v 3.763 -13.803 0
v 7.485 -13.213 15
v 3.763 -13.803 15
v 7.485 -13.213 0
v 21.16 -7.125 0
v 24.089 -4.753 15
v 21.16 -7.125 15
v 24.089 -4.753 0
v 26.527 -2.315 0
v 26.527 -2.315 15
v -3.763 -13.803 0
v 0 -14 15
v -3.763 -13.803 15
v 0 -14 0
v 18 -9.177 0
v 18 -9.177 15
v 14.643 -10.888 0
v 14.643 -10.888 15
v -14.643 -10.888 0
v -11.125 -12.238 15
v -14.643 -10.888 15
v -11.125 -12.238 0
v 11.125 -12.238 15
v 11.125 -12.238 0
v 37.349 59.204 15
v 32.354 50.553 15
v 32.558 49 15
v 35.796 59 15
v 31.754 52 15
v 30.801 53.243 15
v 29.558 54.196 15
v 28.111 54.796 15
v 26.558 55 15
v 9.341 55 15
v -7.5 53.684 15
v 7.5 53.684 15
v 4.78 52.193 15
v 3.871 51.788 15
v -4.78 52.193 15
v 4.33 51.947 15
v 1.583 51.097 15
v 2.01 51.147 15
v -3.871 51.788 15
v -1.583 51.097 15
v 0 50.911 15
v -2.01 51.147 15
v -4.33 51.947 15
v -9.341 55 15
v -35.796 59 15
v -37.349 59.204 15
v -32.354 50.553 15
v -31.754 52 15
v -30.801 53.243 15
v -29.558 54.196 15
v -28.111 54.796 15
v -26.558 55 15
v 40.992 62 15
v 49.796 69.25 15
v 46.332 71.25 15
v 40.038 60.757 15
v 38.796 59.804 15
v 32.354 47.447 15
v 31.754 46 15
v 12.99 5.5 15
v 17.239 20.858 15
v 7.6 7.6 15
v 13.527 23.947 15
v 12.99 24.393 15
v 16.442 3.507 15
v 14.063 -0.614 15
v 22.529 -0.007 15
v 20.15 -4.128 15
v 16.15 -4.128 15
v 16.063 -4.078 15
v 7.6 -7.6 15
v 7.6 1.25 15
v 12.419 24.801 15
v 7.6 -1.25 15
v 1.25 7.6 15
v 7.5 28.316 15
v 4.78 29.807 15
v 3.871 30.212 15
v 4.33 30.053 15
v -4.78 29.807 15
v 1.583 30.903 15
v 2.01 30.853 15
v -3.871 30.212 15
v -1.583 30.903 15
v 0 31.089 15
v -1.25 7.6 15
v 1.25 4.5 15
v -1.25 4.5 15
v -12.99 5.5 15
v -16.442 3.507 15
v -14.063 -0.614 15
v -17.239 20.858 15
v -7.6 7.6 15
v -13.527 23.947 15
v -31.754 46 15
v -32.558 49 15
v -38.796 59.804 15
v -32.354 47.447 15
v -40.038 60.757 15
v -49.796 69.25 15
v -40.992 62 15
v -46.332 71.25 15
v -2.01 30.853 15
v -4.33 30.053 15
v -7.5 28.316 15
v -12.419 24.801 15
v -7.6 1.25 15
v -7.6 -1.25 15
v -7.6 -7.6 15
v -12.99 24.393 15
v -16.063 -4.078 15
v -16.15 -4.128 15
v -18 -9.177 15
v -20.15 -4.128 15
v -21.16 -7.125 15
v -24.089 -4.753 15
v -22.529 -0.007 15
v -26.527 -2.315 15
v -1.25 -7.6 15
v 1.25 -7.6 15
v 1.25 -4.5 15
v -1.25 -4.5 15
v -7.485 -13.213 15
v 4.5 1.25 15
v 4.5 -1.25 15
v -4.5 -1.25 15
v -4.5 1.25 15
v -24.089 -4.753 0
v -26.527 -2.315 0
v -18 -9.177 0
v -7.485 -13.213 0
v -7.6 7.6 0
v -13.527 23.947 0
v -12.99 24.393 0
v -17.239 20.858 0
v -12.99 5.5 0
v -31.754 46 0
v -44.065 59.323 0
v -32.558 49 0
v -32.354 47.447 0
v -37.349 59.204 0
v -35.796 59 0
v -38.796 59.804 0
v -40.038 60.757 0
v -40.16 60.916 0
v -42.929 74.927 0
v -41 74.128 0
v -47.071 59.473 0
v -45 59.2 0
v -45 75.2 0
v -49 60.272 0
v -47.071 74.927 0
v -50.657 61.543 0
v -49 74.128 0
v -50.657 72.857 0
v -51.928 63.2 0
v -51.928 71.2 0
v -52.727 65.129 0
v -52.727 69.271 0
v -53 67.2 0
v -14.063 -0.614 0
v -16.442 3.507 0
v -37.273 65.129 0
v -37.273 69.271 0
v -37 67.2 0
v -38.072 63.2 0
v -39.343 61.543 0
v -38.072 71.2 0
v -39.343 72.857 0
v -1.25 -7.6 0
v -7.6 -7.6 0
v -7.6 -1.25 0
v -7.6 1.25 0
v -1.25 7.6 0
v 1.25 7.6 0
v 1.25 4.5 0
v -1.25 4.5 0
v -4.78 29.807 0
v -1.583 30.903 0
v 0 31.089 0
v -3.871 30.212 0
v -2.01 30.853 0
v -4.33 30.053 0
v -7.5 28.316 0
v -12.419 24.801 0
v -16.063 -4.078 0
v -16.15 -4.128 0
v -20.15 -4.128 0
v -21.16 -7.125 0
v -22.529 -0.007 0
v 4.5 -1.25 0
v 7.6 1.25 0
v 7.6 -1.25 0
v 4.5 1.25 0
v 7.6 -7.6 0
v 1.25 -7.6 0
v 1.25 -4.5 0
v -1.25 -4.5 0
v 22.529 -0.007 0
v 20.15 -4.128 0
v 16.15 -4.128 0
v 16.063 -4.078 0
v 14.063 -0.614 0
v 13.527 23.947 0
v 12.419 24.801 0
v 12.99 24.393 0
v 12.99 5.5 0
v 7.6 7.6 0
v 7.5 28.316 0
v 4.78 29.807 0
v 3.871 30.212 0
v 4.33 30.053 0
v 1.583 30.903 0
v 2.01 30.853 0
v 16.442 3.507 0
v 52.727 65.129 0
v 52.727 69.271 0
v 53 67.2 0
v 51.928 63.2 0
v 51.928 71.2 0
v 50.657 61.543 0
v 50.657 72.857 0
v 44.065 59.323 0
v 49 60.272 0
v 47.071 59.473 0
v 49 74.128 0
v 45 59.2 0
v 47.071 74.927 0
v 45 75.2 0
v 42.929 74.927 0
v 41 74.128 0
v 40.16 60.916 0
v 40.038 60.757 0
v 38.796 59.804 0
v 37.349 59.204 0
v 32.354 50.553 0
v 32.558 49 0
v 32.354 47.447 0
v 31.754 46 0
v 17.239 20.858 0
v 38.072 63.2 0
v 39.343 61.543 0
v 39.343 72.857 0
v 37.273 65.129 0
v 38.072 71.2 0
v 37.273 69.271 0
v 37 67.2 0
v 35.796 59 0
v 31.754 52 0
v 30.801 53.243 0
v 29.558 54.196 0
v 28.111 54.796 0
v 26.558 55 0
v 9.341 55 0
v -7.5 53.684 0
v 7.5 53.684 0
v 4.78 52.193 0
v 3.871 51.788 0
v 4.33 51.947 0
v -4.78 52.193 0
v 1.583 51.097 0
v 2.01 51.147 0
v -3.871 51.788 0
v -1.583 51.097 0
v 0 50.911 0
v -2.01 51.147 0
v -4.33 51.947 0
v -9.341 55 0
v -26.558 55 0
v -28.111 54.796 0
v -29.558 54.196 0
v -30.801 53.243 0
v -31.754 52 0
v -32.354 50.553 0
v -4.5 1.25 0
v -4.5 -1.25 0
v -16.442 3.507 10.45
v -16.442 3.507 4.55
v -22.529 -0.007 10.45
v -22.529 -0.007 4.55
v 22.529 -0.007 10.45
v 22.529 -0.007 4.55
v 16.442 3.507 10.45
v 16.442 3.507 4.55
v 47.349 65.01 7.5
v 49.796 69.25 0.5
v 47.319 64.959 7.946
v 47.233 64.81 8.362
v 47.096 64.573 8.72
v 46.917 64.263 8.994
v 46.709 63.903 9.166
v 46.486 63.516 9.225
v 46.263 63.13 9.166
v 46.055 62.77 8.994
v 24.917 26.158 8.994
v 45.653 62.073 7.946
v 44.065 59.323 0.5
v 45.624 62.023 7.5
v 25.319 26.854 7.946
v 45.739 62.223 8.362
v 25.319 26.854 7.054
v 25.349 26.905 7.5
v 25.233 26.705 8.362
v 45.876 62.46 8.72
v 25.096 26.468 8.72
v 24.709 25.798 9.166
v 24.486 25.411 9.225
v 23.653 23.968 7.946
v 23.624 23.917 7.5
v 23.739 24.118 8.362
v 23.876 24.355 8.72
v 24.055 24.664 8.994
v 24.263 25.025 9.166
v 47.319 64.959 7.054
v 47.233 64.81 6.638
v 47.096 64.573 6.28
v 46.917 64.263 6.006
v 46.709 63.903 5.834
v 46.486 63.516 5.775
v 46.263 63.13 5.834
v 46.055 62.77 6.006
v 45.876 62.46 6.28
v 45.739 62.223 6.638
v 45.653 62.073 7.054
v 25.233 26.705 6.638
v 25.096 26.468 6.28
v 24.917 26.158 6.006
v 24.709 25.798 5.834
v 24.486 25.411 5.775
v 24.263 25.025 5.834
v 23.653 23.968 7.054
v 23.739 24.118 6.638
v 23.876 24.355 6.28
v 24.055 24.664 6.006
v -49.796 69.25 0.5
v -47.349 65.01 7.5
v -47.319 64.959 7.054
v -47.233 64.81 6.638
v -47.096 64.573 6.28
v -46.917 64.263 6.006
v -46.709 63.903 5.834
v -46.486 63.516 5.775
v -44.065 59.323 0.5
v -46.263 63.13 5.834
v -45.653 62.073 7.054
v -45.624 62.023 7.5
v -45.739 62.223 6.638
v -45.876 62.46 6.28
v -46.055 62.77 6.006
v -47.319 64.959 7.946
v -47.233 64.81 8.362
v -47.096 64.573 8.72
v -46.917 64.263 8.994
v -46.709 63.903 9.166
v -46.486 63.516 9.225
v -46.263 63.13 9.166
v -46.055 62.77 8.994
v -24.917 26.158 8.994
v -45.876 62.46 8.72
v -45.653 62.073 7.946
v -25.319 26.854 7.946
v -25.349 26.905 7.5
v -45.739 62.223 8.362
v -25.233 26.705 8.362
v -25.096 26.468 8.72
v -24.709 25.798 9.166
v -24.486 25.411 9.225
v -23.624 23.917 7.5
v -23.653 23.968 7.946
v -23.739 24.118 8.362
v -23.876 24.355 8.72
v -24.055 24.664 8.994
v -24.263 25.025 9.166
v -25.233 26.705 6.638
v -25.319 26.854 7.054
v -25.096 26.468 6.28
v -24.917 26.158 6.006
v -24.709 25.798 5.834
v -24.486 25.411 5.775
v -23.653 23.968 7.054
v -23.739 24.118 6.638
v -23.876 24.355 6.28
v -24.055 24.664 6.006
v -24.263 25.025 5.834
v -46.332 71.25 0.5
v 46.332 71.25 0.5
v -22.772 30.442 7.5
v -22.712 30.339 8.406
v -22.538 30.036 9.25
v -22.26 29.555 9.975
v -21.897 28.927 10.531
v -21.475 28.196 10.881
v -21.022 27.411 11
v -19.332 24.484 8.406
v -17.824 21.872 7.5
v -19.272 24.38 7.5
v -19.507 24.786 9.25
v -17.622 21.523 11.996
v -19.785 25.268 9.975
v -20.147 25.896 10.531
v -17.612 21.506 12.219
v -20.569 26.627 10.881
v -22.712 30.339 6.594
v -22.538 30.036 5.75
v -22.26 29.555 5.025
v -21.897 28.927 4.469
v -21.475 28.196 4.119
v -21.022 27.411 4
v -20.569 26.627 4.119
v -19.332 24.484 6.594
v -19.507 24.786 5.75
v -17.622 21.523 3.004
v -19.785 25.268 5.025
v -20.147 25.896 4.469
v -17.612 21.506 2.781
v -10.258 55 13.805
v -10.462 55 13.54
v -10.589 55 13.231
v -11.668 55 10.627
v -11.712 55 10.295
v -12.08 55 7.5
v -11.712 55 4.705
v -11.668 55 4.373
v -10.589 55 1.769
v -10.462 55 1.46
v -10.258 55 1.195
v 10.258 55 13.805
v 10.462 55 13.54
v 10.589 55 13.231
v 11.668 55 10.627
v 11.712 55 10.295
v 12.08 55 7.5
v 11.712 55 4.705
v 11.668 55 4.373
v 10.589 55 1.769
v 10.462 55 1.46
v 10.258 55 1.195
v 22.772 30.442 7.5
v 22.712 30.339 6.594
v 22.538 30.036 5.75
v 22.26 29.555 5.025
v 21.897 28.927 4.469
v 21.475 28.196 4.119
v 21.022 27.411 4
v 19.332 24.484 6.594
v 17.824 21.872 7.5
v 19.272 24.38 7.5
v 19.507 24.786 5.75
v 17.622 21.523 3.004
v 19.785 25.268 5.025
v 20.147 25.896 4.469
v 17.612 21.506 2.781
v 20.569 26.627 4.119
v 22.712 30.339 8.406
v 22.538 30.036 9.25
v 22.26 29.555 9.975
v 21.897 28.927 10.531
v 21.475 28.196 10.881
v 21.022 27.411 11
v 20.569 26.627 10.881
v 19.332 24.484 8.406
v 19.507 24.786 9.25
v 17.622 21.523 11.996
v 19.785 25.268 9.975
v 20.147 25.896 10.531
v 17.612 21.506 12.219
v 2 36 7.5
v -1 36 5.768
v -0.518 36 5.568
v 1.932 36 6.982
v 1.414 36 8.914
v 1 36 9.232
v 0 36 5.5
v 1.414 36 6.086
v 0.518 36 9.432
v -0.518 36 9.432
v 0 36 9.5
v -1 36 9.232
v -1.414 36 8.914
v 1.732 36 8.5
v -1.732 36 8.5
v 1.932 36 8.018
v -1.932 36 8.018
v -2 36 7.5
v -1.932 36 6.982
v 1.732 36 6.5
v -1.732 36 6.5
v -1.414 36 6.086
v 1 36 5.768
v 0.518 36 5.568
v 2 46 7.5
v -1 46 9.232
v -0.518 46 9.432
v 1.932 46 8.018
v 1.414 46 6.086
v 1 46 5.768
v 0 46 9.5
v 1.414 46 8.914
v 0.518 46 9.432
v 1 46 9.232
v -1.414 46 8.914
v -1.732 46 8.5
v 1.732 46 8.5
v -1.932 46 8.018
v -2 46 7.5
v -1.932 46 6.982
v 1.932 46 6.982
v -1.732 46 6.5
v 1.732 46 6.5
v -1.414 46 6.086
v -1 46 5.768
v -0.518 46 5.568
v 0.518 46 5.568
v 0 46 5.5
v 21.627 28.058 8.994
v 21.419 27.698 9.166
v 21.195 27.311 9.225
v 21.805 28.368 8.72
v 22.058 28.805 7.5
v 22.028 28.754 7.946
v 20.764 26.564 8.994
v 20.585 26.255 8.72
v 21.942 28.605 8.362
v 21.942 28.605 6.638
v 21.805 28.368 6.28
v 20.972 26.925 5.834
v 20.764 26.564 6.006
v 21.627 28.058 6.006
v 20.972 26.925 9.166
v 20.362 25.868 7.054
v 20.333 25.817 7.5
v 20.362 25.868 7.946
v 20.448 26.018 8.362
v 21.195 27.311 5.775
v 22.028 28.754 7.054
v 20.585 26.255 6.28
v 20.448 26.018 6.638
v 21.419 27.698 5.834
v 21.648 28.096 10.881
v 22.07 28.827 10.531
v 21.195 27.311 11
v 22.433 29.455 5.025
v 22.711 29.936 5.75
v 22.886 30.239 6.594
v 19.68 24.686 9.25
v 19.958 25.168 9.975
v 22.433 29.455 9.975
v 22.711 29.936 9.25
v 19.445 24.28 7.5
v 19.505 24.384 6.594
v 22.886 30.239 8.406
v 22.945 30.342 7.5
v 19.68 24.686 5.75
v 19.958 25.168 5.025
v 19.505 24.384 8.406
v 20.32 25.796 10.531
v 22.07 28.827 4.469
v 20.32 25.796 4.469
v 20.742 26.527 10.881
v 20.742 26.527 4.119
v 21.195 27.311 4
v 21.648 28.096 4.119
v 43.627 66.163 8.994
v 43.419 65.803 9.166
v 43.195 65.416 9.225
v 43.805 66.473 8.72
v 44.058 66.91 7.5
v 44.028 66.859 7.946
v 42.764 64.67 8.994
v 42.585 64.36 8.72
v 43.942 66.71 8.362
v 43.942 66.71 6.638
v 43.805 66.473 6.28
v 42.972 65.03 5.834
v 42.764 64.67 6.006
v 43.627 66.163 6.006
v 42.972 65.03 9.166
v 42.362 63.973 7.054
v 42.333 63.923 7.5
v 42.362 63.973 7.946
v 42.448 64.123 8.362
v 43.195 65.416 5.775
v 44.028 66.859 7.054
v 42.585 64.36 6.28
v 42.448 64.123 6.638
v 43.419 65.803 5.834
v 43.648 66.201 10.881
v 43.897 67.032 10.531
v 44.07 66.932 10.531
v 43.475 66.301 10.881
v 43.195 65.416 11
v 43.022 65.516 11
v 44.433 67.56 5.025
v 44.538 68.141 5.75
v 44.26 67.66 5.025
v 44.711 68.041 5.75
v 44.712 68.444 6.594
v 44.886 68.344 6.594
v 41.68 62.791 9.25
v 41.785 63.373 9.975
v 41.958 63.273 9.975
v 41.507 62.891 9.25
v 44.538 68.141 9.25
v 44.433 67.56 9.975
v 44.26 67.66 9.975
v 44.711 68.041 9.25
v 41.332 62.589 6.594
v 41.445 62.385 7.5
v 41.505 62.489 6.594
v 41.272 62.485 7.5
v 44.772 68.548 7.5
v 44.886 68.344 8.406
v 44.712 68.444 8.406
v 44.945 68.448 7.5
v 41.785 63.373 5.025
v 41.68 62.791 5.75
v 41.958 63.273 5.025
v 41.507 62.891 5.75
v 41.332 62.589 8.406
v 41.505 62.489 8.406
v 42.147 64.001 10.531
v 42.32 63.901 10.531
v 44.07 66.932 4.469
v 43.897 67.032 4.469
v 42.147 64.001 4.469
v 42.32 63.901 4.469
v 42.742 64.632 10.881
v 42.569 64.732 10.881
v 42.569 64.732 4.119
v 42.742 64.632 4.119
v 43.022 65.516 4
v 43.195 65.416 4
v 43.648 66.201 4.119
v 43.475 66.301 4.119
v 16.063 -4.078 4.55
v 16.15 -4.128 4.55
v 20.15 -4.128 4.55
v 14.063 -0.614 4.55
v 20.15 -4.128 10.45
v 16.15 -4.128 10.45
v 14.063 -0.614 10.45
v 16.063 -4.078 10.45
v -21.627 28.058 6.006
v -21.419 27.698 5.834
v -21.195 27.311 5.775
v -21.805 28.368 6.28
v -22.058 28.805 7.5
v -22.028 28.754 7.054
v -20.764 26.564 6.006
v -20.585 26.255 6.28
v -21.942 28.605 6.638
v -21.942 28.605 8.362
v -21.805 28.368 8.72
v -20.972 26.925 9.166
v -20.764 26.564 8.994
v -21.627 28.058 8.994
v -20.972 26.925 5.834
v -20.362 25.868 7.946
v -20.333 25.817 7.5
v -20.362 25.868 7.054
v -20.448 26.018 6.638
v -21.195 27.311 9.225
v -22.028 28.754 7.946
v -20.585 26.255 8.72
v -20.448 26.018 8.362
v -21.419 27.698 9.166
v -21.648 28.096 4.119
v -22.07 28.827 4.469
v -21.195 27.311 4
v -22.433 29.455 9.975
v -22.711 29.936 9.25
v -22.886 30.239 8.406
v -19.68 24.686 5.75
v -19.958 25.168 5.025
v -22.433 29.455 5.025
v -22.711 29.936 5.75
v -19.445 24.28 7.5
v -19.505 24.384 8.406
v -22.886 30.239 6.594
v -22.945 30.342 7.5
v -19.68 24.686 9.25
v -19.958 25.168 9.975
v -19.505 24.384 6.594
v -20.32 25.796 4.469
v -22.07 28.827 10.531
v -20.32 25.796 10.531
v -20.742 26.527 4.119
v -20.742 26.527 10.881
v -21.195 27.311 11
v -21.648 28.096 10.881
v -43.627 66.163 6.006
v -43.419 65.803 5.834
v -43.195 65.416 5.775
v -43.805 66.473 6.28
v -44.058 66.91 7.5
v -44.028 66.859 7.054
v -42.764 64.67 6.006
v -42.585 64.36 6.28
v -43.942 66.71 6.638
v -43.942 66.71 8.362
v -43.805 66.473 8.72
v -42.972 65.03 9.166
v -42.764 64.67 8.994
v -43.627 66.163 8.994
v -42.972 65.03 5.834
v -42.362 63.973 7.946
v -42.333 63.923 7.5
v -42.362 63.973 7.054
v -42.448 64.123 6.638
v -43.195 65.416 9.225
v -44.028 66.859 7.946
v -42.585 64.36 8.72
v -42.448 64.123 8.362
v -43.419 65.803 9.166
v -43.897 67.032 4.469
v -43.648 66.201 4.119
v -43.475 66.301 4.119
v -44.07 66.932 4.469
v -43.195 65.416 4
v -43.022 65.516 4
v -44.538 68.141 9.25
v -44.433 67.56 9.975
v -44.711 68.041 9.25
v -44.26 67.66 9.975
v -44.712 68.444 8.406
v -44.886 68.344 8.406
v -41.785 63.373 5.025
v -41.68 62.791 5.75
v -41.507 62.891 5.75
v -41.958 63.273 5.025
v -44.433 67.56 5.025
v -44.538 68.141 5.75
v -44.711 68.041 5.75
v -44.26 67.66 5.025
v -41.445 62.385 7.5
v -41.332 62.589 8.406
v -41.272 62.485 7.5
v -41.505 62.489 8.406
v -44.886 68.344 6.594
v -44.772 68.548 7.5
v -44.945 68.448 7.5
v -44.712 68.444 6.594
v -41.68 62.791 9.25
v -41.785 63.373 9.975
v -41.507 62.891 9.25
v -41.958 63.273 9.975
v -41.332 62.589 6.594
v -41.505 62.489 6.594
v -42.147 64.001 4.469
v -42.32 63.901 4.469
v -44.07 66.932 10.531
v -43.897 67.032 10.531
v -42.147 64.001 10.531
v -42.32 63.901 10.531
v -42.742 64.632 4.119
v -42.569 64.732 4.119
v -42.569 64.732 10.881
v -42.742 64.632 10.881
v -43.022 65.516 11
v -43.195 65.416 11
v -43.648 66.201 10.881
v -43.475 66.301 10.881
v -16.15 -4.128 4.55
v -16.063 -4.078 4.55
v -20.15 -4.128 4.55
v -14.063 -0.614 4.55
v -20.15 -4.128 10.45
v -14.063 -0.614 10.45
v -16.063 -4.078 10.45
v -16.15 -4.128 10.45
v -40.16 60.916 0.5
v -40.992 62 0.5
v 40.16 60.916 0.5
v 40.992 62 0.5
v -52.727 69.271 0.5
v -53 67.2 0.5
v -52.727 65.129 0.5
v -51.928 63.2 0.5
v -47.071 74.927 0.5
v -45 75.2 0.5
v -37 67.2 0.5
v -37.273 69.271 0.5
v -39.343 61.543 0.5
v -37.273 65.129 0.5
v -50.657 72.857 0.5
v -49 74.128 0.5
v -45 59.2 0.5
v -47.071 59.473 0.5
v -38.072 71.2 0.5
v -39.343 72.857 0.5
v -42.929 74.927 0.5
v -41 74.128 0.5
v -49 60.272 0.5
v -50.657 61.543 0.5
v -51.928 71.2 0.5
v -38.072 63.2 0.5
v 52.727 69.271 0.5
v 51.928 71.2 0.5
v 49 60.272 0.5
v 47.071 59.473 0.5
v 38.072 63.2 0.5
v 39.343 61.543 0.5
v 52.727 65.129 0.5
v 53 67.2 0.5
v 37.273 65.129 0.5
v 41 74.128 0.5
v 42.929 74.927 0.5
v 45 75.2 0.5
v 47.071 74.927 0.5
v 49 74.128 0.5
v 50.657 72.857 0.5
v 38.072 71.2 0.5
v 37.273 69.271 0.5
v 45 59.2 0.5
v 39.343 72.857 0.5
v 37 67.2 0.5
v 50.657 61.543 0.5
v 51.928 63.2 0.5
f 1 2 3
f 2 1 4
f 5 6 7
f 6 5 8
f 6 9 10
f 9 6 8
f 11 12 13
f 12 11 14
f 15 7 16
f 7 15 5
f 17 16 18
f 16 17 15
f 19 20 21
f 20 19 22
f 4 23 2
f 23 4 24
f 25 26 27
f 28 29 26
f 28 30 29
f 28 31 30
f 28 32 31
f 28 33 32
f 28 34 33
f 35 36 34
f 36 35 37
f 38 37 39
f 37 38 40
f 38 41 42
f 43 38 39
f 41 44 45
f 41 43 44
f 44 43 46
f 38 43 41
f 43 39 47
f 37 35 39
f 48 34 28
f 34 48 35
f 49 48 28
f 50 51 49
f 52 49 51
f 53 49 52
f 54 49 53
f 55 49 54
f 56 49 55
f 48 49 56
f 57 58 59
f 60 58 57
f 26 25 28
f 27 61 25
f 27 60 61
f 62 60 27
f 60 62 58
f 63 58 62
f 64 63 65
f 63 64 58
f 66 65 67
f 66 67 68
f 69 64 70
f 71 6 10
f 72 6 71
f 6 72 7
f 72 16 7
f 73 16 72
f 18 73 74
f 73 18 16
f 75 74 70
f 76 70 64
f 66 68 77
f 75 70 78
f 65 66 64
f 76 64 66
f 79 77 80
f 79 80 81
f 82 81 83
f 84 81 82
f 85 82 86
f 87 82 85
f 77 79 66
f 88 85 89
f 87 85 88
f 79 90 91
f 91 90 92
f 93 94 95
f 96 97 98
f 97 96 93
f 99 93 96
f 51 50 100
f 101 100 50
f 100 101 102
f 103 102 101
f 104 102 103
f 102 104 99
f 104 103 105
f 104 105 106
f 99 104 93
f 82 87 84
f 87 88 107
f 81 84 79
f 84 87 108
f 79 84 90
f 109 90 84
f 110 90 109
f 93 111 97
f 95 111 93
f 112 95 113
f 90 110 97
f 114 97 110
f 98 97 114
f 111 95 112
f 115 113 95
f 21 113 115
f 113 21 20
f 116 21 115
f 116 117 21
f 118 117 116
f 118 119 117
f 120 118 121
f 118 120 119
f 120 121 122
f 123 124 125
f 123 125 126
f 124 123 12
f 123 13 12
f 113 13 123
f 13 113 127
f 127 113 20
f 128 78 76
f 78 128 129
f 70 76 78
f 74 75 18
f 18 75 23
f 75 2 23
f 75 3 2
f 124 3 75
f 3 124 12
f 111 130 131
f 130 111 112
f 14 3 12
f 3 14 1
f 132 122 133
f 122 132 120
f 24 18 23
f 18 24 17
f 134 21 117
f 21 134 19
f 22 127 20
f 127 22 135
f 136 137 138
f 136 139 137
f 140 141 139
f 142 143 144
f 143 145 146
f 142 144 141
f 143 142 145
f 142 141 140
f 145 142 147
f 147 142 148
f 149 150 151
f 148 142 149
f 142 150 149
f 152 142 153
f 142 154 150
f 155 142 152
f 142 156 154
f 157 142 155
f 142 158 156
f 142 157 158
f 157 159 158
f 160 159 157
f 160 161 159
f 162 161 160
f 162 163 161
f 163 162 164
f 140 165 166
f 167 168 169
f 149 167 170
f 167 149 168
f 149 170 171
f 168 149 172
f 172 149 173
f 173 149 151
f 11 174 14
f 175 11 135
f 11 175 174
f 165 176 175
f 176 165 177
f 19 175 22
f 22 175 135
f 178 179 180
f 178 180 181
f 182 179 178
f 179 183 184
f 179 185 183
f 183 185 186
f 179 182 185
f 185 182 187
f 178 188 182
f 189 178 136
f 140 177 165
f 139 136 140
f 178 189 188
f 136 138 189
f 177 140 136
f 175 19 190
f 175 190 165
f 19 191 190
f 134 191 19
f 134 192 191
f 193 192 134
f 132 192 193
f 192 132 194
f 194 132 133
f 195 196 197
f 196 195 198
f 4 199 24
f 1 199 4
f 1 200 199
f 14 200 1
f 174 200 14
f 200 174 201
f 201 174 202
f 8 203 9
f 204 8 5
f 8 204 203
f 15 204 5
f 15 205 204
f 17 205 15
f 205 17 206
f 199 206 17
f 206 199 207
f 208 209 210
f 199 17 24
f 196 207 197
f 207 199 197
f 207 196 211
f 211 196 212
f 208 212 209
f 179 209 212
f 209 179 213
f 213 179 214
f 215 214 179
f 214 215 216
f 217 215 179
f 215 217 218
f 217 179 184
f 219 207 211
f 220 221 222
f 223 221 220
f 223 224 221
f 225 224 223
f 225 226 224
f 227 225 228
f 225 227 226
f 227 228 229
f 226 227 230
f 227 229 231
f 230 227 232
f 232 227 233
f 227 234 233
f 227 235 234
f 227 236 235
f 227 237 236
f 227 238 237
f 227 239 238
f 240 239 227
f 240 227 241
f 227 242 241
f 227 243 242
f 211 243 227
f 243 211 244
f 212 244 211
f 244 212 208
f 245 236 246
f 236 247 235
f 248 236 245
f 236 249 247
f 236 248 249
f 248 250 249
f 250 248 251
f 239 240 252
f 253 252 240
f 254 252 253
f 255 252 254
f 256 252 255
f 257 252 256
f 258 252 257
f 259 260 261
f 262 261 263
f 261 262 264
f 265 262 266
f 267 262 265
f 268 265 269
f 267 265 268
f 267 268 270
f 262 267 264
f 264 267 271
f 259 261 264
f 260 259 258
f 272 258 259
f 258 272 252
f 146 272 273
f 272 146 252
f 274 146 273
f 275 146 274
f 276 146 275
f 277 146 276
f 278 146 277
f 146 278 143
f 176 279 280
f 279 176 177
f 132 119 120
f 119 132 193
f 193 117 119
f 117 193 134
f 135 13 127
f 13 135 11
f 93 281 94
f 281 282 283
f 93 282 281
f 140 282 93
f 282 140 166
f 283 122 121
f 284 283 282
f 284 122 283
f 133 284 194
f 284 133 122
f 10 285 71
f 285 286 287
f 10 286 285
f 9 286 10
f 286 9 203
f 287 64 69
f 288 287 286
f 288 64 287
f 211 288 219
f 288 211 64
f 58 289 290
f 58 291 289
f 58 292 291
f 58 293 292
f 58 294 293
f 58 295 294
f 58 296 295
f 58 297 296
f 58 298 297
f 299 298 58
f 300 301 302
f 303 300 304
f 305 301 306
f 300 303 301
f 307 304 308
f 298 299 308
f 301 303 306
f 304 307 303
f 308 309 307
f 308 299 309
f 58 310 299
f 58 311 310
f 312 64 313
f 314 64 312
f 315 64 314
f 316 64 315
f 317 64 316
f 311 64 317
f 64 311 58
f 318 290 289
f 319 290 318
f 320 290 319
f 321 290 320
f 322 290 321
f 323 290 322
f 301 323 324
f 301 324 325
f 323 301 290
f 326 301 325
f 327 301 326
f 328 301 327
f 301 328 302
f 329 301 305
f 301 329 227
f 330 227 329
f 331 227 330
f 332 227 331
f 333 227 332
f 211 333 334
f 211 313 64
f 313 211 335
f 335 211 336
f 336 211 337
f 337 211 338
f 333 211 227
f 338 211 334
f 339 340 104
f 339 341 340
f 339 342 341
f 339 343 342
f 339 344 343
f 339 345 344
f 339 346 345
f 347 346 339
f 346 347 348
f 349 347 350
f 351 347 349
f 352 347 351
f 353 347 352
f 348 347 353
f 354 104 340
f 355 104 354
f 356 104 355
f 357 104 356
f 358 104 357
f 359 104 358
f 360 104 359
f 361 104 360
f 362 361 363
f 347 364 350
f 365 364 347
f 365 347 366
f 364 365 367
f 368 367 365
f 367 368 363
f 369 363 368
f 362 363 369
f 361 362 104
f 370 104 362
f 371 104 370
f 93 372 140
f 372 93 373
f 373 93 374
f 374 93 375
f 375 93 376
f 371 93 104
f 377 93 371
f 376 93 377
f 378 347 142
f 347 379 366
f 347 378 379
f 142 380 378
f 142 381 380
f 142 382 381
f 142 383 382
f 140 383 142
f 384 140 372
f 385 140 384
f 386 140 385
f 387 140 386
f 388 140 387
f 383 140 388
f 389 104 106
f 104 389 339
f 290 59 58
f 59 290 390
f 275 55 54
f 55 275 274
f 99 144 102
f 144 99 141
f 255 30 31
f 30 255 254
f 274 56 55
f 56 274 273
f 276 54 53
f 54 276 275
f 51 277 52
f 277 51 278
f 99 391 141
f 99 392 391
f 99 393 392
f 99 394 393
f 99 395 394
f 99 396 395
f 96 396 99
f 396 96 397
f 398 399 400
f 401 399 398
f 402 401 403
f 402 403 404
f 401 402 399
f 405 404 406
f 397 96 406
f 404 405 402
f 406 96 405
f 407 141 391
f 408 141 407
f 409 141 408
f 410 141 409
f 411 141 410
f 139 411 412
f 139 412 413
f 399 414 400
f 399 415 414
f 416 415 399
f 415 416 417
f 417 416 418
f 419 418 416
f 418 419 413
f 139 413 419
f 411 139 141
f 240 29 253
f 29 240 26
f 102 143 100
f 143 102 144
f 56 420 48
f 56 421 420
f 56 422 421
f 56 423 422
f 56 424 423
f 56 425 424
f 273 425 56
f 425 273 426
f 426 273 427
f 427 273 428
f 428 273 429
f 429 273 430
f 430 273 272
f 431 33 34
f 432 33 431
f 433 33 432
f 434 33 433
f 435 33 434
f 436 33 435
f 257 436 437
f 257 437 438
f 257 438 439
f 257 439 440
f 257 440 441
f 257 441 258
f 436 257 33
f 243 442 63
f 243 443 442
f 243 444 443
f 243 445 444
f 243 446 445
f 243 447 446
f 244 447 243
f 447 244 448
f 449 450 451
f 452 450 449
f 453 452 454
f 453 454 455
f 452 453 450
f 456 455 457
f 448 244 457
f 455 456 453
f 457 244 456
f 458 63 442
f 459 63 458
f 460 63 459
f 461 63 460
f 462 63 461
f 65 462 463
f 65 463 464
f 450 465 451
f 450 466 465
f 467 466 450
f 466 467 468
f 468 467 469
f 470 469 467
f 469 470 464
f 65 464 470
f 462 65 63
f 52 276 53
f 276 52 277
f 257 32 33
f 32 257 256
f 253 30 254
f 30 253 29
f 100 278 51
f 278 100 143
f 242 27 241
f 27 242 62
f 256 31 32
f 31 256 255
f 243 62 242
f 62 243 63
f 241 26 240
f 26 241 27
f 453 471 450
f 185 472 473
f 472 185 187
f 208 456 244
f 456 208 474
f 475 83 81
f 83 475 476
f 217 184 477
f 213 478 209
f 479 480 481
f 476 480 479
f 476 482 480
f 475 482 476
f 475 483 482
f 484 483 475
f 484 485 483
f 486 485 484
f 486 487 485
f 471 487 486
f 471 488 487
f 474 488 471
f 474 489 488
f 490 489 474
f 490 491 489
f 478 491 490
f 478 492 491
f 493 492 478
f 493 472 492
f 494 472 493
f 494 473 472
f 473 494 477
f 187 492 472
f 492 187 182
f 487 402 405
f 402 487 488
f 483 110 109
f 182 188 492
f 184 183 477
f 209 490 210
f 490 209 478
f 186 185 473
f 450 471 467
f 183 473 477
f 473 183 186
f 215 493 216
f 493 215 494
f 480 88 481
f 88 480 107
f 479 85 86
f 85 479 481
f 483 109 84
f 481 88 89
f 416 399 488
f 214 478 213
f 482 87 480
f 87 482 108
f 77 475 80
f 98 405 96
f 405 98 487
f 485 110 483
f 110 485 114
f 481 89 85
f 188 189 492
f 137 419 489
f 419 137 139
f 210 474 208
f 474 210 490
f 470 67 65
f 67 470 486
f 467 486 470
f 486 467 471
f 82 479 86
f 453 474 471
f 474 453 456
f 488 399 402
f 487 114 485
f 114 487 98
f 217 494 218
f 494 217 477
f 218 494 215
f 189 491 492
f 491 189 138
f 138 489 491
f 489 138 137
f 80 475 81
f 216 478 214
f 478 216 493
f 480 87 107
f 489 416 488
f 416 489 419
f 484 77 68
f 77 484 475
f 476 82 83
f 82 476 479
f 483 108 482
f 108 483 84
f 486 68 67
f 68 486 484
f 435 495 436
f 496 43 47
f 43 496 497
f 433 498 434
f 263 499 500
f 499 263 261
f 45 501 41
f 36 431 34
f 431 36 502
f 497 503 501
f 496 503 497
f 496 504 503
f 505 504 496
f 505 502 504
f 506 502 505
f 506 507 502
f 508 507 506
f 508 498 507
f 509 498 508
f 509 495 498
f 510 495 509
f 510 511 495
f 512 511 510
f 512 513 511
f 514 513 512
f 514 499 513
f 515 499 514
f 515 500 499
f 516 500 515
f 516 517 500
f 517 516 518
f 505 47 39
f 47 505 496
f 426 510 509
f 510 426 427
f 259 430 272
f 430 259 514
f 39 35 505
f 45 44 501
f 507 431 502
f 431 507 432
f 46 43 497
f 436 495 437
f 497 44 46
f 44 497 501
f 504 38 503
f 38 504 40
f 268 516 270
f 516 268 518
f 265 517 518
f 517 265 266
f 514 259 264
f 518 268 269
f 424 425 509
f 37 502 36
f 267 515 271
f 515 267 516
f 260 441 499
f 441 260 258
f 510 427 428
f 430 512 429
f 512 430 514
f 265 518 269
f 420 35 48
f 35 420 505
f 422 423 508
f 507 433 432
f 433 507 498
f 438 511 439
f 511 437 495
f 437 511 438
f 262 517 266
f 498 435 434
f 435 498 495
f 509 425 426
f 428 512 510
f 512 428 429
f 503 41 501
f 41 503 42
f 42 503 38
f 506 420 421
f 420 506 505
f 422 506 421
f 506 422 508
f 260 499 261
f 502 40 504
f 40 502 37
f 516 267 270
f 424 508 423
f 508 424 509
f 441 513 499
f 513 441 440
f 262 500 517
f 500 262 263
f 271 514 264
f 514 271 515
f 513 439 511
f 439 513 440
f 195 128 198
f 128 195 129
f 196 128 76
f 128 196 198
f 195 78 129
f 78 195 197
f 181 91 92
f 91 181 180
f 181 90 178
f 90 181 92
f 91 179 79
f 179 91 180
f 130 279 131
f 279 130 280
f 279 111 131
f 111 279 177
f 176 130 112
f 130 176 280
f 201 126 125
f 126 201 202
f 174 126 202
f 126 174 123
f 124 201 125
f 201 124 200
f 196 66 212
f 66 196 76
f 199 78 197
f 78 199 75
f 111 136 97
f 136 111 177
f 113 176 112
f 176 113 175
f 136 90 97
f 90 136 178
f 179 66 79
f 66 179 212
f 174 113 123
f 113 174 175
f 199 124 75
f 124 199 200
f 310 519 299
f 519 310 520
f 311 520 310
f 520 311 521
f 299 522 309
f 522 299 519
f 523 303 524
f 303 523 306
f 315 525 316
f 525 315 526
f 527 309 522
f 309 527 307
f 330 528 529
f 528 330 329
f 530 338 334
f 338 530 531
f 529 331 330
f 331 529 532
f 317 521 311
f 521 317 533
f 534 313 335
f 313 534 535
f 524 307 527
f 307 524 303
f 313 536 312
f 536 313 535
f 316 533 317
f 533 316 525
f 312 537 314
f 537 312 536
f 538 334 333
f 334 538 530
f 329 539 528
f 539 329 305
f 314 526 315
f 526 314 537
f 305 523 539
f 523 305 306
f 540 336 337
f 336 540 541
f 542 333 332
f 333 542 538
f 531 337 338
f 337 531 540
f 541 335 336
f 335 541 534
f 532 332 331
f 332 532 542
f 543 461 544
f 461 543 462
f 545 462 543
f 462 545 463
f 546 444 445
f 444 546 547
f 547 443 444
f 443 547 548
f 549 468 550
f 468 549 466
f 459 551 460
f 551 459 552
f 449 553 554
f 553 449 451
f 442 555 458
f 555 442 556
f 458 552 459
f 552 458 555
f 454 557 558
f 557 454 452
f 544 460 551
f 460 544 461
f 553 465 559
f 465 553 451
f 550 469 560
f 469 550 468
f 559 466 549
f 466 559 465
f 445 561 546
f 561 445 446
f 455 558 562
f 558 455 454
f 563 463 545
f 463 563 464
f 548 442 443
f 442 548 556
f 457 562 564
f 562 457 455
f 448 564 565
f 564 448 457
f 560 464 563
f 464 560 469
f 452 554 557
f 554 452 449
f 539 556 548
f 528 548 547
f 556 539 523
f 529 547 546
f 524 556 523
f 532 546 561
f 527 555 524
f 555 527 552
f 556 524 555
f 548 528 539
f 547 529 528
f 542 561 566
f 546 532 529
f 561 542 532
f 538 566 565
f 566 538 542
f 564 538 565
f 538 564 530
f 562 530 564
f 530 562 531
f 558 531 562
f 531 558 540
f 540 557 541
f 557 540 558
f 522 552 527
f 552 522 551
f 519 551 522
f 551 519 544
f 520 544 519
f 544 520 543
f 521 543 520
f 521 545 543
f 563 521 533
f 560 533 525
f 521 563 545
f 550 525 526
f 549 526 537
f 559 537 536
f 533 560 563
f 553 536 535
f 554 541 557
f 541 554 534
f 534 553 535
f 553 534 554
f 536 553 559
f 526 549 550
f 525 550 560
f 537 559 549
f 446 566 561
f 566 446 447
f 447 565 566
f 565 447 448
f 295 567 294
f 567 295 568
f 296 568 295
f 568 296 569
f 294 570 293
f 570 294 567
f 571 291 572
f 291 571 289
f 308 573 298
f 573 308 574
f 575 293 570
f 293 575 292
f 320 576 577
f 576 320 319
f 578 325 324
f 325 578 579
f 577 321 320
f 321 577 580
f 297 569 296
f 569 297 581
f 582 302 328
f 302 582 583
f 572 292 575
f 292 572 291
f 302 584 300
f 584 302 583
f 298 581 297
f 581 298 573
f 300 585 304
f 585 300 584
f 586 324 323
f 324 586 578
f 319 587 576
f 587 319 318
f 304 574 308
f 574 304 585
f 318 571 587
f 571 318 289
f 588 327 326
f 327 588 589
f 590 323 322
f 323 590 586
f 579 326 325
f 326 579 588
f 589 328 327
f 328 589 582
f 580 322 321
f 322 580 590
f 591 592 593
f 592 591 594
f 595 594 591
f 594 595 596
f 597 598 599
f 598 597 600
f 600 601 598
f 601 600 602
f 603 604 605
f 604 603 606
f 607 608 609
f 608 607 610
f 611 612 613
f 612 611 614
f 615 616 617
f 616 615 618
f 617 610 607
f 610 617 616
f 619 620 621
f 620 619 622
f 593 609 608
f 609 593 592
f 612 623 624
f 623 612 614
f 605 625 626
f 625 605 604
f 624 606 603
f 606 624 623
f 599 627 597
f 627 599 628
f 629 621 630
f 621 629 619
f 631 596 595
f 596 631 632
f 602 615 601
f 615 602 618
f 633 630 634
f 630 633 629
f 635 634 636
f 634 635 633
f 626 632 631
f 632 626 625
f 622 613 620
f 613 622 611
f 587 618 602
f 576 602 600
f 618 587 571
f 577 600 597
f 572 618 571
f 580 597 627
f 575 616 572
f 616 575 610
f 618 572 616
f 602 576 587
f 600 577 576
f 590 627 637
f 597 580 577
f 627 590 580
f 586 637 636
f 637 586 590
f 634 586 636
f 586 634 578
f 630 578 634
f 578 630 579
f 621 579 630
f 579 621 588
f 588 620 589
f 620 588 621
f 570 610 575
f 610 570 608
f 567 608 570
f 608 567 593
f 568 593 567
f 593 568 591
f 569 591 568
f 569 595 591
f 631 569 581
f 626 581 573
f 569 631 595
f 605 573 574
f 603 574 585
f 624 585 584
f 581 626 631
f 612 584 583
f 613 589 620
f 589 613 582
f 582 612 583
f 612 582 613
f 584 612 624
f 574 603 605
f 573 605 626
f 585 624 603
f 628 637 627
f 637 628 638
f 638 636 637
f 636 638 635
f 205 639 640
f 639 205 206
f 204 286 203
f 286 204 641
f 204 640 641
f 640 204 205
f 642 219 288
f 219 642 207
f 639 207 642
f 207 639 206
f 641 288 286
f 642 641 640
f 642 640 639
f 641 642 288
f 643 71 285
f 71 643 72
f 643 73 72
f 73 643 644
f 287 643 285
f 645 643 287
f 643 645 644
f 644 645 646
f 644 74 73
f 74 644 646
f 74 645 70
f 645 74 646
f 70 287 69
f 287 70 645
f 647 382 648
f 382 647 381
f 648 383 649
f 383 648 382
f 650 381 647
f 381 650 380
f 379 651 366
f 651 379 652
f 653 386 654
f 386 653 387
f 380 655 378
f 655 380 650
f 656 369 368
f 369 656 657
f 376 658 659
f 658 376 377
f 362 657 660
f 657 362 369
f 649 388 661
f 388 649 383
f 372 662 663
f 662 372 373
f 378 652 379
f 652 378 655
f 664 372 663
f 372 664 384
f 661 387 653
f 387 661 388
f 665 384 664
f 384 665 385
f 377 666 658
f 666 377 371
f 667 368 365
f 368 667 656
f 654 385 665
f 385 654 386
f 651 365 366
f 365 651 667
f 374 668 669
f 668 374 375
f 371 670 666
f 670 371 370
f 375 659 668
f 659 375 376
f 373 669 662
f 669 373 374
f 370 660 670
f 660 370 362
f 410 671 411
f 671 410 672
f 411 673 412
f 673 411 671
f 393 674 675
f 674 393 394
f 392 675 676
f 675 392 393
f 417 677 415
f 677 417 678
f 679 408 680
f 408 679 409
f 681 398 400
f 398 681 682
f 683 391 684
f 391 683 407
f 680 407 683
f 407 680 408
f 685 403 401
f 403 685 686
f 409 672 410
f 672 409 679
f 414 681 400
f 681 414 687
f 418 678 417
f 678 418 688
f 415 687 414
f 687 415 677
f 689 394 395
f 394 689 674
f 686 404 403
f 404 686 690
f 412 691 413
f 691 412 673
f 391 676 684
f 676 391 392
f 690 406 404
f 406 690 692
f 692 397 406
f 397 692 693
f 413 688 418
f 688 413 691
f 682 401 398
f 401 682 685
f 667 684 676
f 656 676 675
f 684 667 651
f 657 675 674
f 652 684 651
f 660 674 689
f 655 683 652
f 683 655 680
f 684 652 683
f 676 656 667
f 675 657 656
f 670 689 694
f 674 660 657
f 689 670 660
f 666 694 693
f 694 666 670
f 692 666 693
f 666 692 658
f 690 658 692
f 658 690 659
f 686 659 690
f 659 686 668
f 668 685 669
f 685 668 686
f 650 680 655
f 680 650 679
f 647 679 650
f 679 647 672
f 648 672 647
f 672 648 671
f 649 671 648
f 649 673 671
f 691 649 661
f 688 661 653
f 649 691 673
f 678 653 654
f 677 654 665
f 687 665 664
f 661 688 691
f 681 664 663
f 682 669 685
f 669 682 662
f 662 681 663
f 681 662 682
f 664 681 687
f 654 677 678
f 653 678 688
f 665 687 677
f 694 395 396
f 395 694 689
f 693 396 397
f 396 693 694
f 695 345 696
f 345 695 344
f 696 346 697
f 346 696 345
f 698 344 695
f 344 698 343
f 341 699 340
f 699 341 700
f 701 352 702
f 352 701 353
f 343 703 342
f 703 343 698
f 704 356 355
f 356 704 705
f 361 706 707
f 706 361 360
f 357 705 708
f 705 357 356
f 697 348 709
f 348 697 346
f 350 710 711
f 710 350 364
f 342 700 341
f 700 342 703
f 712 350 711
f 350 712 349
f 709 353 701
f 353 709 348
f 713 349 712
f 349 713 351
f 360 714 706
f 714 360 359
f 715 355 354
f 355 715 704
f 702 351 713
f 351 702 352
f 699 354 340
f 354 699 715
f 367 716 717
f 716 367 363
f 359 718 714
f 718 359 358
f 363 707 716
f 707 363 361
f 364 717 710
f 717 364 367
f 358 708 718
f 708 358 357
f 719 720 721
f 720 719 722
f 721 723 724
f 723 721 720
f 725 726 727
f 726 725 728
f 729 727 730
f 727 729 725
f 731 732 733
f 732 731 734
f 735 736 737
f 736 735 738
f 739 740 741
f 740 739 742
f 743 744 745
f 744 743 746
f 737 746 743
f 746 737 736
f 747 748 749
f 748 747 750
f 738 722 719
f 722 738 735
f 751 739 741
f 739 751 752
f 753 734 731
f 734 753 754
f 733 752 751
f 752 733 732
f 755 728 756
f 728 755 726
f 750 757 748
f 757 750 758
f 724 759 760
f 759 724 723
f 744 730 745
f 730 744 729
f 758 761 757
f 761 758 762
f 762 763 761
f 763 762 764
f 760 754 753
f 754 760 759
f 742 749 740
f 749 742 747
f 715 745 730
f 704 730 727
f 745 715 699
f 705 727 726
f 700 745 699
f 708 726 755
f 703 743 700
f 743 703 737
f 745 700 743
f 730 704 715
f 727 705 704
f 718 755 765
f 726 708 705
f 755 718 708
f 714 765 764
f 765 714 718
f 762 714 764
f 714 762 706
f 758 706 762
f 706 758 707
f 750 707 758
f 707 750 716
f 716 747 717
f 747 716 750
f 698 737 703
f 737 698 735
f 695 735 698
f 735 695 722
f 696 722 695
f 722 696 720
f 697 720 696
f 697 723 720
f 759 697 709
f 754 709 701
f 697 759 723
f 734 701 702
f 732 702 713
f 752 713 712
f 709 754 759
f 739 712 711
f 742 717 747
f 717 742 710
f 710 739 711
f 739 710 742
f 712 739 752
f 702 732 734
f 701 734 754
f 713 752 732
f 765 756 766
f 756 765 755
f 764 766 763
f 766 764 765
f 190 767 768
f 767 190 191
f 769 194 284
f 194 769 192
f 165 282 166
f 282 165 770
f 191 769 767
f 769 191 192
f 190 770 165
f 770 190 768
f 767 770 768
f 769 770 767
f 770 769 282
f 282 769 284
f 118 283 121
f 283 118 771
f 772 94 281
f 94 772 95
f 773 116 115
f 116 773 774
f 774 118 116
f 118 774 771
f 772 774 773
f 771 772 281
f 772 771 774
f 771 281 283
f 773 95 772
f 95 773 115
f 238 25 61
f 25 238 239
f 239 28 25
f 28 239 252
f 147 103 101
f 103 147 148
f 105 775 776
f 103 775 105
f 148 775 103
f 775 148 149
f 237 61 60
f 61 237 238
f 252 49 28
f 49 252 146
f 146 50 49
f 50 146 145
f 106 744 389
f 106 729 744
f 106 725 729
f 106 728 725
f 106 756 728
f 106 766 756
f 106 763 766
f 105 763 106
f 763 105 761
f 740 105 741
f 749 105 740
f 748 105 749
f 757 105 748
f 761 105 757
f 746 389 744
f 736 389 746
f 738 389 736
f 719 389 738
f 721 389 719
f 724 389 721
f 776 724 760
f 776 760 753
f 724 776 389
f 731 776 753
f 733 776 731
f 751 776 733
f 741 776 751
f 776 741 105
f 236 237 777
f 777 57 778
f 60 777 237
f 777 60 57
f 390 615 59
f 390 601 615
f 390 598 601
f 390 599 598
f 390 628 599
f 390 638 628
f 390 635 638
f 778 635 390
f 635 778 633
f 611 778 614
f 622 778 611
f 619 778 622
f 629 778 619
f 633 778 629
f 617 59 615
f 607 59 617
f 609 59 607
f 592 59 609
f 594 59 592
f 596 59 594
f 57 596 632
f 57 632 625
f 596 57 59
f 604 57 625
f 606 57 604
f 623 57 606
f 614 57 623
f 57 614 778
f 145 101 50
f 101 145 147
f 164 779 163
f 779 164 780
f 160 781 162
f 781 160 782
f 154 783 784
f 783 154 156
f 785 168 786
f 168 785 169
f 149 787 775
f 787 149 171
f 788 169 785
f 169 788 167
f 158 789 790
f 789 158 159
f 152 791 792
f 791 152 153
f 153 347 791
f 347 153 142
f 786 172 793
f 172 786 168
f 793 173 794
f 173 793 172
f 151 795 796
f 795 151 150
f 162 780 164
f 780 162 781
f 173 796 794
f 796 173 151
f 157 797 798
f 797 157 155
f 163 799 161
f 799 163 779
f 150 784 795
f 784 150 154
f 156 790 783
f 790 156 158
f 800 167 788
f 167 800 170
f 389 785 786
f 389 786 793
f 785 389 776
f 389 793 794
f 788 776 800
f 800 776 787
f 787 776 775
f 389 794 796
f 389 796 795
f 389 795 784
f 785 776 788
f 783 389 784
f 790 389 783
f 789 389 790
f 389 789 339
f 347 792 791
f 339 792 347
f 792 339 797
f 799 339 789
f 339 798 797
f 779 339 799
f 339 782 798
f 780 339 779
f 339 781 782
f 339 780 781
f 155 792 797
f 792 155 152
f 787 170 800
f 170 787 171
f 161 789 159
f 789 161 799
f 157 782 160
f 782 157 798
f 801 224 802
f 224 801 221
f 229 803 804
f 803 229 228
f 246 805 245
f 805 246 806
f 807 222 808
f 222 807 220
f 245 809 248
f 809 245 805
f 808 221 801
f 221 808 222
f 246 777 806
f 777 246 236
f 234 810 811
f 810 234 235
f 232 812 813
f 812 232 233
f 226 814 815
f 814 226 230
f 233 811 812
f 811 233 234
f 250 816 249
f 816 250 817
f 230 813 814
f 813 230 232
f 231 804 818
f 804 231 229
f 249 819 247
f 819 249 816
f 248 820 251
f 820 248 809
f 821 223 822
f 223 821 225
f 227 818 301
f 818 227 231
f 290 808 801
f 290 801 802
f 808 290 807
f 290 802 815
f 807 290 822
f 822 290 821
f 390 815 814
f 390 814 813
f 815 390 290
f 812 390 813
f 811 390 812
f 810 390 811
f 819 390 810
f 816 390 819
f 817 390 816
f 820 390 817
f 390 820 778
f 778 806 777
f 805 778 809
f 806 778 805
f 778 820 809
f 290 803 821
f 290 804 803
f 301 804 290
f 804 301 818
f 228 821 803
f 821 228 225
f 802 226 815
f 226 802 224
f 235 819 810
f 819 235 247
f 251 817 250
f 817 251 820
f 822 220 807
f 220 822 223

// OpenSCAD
// file: configuration.scad
// Increase this if your slicer or printer make holes too tight.
extra_radius = 0.1;

// OD = outside diameter, corner to corner.
m2_nut_od = 5.1;
m2_nut_radius = m2_nut_od/2 + 0.2 + extra_radius;
m2_nut_thickness = 2.4 + extra_radius;
m2_washer_radius = 3.5 + extra_radius;

// Major diameter of metric 2mm thread.
m2_major = 1.85;
m2_radius = m2_major/2 + extra_radius;
m2_wide_radius = m2_major/2 + extra_radius + 0.2;

// OD = outside diameter, corner to corner.
m3_nut_od = 6.1;
m3_nut_radius = m3_nut_od/2 + 0.2 + extra_radius;
m3_nut_thickness = 2.4 + extra_radius;
m3_washer_radius = 3.5 + extra_radius;

// Major diameter of metric 3mm thread.
m3_major = 2.85;
m3_radius = m3_major/2 + extra_radius;
m3_wide_radius = m3_major/2 + extra_radius + 0.2;

// OD = outside diameter, corner to corner.
m4_nut_od = 7.1;
m4_nut_radius = m4_nut_od/2 + 0.2 + extra_radius;
m4_thickness = 3.82 + extra_radius;
m4_washer_radius = 4.5 + extra_radius;

// Major diameter of metric 3mm thread.
m4_major = 3.85;
m4_radius = m4_major/2 + extra_radius;
m4_wide_radius = m4_major/2 + extra_radius + 0.2;

// NEMA17 stepper motors.
motor_shaft_diameter = 5;
motor_shaft_radius = motor_shaft_diameter/2 + extra_radius;

// Frame brackets. M3x8mm screws work best with 3.6 mm brackets.
thickness = 3.6;

// OpenBeam or Misumi. Currently only 15x15 mm, but there is a plan
// to make models more parametric and allow 20x20 mm in the future.
extrusion = 15;

// Placement for the NEMA17 stepper motors.
motor_offset = 44;
motor_length = 47;
// main file
include <configuration.scad>;

$fn = 24;
roundness = 6;

module extrusion_cutout(h, extra) {
  difference() {
    cube([extrusion+extra, extrusion+extra, h], center=true);
    for (a = [0:90:359]) rotate([0, 0, a]) {
      translate([extrusion/2, 0, 0])
        cube([6, 2.5, h+1], center=true);
    }
  }
}

module screw_socket() {
  cylinder(r=m3_wide_radius, h=20, center=true);
  translate([0, 0, 3.8]) cylinder(r=3.5, h=5);
}

module screw_socket_cone() {
  union() {
    screw_socket();
    scale([1, 6, -1]) # cylinder(r=7, h=4);
  }
}

module vertex(height, idler_offset, idler_space) {
  union() {
    // Pads to improve print bed adhesion for slim ends.
    translate([-(37.5 + idler_offset/2), 52.2 + idler_offset, -height/2]) cylinder(r=8, h=0.5);
    translate([(37.5 + idler_offset/2), 52.2 + idler_offset, -height/2]) cylinder(r=8, h=0.5);
    difference() {
      union() {
        intersection() {
          translate([0, 22, 0])
            cylinder(r=36, h=height, center=true, $fn=60);
          translate([0, -37, 0]) rotate([0, 0, 30])
            cylinder(r=50, h=height+1, center=true, $fn=6);
        }
        translate([0, 38, 0]) intersection() {
          translate([0, idler_offset, 0]) rotate([0, 0, -90])
            cylinder(r=55 + idler_offset, h=height, center=true, $fn=3);
          translate([0, 10, 0])
            cube([100 + idler_offset, 100 + idler_offset, 2*height], center=true);
          translate([0, -10, 0]) rotate([0, 0, 30])
            cylinder(r=55 + idler_offset, h=height+1, center=true, $fn=6);
        }
      }
      difference() {
        translate([0, 58, 0]) minkowski() {
          intersection() {
            rotate([0, 0, -90])
              cylinder(r=55, h=height, center=true, $fn=3);
            translate([0, -32 + idler_offset / 2, 0])
              cube([100, 16 + idler_offset, 2*height], center=true);
          }
          cylinder(r=roundness, h=1, center=true);
        }
        // Idler support cones.
        translate([0, 26+idler_offset-30, 0]) rotate([-90, 0, 0])
          cylinder(r1=30, r2=2, h=30-idler_space/2);
        translate([0, 26+idler_offset+30, 0]) rotate([90, 0, 0])
          cylinder(r1=30, r2=2, h=30-idler_space/2);
      }
      translate([0, 58, 0]) minkowski() {
        intersection() {
          rotate([0, 0, -90])
            cylinder(r=55, h=height, center=true, $fn=3);
          translate([0, 7 + idler_offset, 0])
            cube([100, 30, 2*height], center=true);
        }
        cylinder(r=roundness, h=1, center=true);
      }
      extrusion_cutout(height+10, 2*extra_radius);

      for (z = [30:30:height]) {
        translate([0, -7.5-extra_radius, z+7.5-height/2]) rotate([90, 0, 0])
          screw_socket_cone();
      }

      for (z = [0:30:height]) {
        for (a = [-1, 1]) {
          rotate([0, 0, 30*a]) translate([-16*a, 111, z+7.5-height/2]) {
            // % rotate([90, 0, 0]) extrusion_cutout(200, 0);
            // Screw sockets.
            for (y = [-88 + (idler_offset / 4) * 3, -44 + (idler_offset / 4) * 3]) {
              translate([a*7.5, y, 0]) rotate([0, a*90, 0]) screw_socket();
            }
            // Nut tunnels.
            for (z = [-1, 1]) {
              scale([1, 1, z]) translate([0, -100, 3]) minkowski() {
                rotate([0, 0, -a*30]) cylinder(r=4, h=16, $fn=6);
                cube([0.1, 5, 0.1], center=true);
              }
            }
          }
        }
      }
    }
  }
}

translate([0, 0, 7.5]) vertex(15, idler_offset=15, idler_space=10);
